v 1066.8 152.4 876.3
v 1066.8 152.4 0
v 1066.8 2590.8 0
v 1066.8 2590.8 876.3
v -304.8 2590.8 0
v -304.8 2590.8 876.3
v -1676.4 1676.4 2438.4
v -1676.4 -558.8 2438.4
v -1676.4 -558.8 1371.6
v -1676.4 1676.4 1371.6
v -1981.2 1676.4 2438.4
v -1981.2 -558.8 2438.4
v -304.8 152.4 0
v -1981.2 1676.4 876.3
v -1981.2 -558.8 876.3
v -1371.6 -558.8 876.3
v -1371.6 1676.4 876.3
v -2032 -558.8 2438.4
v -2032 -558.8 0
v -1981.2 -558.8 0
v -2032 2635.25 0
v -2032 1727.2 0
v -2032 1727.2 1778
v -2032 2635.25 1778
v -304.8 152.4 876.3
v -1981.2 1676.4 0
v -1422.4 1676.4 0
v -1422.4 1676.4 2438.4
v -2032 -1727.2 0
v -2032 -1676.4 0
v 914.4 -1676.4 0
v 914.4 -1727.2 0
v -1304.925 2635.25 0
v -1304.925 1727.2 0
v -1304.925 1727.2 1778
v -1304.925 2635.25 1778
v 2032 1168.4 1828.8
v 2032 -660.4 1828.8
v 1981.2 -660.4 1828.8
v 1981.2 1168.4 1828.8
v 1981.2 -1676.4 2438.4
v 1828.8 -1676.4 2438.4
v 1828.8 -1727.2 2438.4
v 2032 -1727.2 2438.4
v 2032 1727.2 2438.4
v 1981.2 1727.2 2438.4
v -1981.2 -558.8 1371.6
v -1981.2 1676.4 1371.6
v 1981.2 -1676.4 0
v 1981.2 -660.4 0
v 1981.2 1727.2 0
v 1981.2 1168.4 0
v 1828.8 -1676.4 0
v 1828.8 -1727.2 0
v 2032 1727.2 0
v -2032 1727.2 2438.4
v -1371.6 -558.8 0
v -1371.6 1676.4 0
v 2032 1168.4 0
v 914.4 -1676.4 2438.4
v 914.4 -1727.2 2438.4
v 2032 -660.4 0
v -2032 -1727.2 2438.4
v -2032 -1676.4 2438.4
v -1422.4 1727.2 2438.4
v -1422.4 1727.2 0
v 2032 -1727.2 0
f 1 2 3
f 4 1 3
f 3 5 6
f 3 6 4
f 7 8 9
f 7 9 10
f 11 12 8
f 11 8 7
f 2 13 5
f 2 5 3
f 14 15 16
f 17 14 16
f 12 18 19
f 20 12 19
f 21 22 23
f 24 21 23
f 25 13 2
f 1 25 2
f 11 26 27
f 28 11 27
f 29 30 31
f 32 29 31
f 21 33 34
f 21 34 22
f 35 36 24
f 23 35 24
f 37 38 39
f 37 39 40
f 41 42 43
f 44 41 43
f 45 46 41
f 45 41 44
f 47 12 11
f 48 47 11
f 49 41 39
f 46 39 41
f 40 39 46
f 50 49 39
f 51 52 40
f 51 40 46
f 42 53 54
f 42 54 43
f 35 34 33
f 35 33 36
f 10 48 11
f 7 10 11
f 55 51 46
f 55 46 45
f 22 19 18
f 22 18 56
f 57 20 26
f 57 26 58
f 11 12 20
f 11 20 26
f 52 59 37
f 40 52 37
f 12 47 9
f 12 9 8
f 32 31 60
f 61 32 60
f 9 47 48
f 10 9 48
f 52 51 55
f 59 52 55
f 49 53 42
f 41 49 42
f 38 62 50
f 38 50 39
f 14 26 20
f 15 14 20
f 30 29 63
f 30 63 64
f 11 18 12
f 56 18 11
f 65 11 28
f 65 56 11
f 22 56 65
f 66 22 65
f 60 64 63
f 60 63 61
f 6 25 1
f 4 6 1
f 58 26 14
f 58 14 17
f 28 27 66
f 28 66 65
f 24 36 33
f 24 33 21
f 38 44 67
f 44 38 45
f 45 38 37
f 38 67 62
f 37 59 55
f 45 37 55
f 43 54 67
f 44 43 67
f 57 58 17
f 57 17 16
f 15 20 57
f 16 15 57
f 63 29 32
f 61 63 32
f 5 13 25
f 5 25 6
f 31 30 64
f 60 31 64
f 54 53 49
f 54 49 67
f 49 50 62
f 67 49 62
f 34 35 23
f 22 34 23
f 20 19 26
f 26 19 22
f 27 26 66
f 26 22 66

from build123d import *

# Parameters (mm, degrees)
F0_W      = 4064
F0_H      = 3454.4
F0_W_2    = 3962.4
F0_H_2    = 3352.8
F1_DEPTH  = 2438.4
F3_DEPTH  = 50.8
F4_W      = 1066.8
F4_H      = 2438.4
F5_DEPTH  = 50.8
F6_W      = 914.4
F6_H      = 2438.4
F7_DEPTH  = 50.8
F8_W      = 1828.8
F8_H      = 1828.8
F9_DEPTH  = 50.8
F11_W     = 609.6
F11_H     = 2235.2
F12_DEPTH = 876.3
F10_W     = 2235.2
F10_H     = 1066.8
F13_DEPTH = 304.8
F14_W     = 2336.8
F14_H     = 2438.4
F15_DEPTH = 50.8
F16_W     = 1371.6
F16_H     = 2438.4
F17_DEPTH = 876.3
F18_W     = 727.075
F18_H     = 1778
F19_DEPTH = 908.05


with BuildPart() as f1:
    # F0 (on Top) → F1 (new body)
    with BuildSketch(Plane.XY):
        Rectangle(F0_W, F0_H)
        Rectangle(F0_W_2, F0_H_2, mode=Mode.SUBTRACT)
    extrude(amount=F1_DEPTH)

    # F2 (on face) → F3 (cut)
    with BuildSketch(Plane(origin=(-2032, 0, 0), x_dir=(0, -1, 0), z_dir=(-1, 0, 0))):
        Polygon((558.8, 0), (1676.4, 0), (1676.4, 2438.4), (1625.6, 2438.4), (558.8, 2438.4), align=None)
    extrude(amount=-F3_DEPTH, mode=Mode.SUBTRACT)

    # F4 (on face) → F5 (cut)
    with BuildSketch(Plane(origin=(0, 1727.2, 0), x_dir=(-1, 0, 0), z_dir=(0, 1, 0))):
        with Locations((-1447.8, 1219.2)):
            Rectangle(F4_W, F4_H)
    extrude(amount=-F5_DEPTH, mode=Mode.SUBTRACT)

    # F6 (on face) → F7 (cut)
    with BuildSketch(Plane(origin=(0, -1676.4, 0), x_dir=(-1, 0, 0), z_dir=(0, 1, 0))):
        with Locations((-1371.6, 1219.2)):
            Rectangle(F6_W, F6_H)
    extrude(amount=-F7_DEPTH, mode=Mode.SUBTRACT)

    # F8 (on face) → F9 (cut)
    with BuildSketch(Plane.YZ.offset(2032)):
        with Locations((254, 914.4)):
            Rectangle(F8_W, F8_H)
    extrude(amount=-F9_DEPTH, mode=Mode.SUBTRACT)

    # F14 (on face) → F15 (cut)
    with BuildSketch(Plane.XZ.offset(-1676.4)):
        with Locations((-254, 1219.2)):
            Rectangle(F14_W, F14_H)
    extrude(amount=-F15_DEPTH, mode=Mode.SUBTRACT)


with BuildPart() as f12:
    # F11 (on face) → F12 (new body)
    with BuildSketch(Plane(origin=(0, 0, 0), x_dir=(1, 0, 0), z_dir=(0, 0, -1))):
        with Locations((-1676.4, -558.8)):
            Rectangle(F11_W, F11_H)
    extrude(amount=-F12_DEPTH)


with BuildPart() as f13:
    # F10 (on face) → F13 (new body)
    with BuildSketch(Plane.YZ.offset(-1981.2)):
        with Locations((558.8, 1905)):
            Rectangle(F10_W, F10_H)
    extrude(amount=F13_DEPTH)


with BuildPart() as f17:
    # F16 (on Top) → F17 (new body)
    with BuildSketch(Plane.XY):
        with Locations((381, 1371.6)):
            Rectangle(F16_W, F16_H)
    extrude(amount=F17_DEPTH)


with BuildPart() as f19:
    # F18 (on face) → F19 (new body)
    with BuildSketch(Plane(origin=(0, 1727.2, 0), x_dir=(-1, 0, 0), z_dir=(0, 1, 0))):
        with Locations((1668.4625, 889)):
            Rectangle(F18_W, F18_H)
    extrude(amount=F19_DEPTH)


solid = Compound([f1.part, f12.part, f13.part, f17.part, f19.part])
